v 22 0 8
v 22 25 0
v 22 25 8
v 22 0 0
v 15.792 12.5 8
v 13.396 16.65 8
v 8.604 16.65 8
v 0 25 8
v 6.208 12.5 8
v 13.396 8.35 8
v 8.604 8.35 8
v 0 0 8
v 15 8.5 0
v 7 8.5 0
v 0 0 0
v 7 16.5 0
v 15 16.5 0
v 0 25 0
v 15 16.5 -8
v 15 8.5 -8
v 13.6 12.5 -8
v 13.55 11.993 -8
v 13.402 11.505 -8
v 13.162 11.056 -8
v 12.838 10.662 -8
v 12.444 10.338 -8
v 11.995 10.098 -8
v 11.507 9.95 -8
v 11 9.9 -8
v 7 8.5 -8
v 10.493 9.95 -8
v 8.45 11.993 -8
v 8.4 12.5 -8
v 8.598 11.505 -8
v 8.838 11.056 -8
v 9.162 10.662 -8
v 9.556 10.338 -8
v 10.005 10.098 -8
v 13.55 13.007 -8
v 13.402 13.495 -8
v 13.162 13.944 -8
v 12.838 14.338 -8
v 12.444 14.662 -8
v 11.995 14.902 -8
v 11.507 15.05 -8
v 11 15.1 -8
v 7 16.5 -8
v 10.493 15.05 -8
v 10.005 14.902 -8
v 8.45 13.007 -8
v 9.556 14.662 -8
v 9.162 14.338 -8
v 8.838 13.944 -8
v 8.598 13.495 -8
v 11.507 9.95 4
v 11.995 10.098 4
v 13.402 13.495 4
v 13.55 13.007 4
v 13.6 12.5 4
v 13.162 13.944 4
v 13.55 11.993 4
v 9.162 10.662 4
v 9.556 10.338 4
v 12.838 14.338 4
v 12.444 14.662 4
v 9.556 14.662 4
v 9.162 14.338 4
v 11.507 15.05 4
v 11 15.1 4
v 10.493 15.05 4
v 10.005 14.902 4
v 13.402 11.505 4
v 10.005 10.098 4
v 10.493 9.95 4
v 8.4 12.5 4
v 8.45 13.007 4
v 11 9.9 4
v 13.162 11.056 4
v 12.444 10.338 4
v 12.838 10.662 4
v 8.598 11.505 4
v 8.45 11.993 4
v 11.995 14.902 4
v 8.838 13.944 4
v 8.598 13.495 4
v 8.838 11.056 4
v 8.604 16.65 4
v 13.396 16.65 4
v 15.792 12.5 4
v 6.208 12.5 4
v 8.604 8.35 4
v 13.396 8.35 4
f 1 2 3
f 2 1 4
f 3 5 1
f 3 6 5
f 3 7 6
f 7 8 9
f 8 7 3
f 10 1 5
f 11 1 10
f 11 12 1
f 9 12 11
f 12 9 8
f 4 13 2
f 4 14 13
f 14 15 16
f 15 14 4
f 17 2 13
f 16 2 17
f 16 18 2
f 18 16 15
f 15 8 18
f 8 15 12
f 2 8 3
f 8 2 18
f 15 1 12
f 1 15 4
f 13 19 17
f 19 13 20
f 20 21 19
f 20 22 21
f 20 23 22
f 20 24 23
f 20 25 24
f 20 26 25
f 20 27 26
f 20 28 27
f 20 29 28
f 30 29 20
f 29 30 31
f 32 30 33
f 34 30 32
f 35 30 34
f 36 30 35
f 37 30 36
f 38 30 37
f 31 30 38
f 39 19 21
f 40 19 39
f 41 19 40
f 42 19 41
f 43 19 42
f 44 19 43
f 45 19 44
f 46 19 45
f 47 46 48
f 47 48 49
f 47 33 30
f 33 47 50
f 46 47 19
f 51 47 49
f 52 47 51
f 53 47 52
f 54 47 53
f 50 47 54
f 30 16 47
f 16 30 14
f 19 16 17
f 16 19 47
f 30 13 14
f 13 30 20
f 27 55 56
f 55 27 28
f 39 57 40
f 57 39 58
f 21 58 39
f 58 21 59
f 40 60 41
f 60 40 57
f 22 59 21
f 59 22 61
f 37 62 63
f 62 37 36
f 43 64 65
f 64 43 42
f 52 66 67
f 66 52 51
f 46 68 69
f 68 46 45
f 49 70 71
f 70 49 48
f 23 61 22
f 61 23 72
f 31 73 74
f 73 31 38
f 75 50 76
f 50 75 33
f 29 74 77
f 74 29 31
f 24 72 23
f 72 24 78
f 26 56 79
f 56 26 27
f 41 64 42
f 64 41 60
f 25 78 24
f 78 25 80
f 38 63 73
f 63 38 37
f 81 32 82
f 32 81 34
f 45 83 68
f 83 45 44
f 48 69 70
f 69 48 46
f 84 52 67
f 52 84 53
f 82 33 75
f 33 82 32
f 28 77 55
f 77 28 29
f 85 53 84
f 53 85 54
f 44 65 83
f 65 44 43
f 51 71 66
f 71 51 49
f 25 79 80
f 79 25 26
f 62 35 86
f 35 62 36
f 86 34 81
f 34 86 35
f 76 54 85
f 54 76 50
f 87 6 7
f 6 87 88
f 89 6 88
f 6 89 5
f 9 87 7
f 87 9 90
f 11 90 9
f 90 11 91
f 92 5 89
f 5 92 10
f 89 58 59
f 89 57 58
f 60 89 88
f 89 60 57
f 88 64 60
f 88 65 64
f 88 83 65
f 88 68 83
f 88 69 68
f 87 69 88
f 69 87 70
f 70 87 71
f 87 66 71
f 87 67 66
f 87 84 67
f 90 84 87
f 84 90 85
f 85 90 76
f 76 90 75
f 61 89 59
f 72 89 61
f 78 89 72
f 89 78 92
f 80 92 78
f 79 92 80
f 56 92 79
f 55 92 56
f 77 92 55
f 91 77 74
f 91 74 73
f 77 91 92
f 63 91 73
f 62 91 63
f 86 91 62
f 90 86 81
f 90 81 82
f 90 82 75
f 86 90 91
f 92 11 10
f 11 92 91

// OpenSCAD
// file: ../params.scad
// ============================================================
// Ham Radio Go Kit — OpenSCAD Parameters
// ============================================================

// ============================================================
// SHELF SLOT — MEASURED (configurable for other shelves)
// ============================================================
slot_width = 8.1;           // mm, slot opening width — MEASURED on Vevor shelf
slot_spacing = 5.0;         // mm, rail width between slots
shelf_thickness = 1.5;      // mm, shelf material thickness
slot_tab_width = 8.0;       // mm, tab width (fits in 8.1mm slot)
slot_tab_depth = 8.0;       // mm, tab depth (how far tab extends below shelf)
slot_tab_engage = 2.0;      // mm, minimum engagement depth for retention

// ============================================================
// M5 HARDWARE
// ============================================================
m5_screw_d = 5.2;           // mm, clearance hole diameter
m5_nut_w = 8.0;             // mm, hex nut width across flats
m5_nut_h = 4.0;             // mm, hex nut height
m5_washer_od = 10.0;        // mm, washer OD - verify clears slot

// ============================================================
// TOLERANCES
// ============================================================
fit_clearance = 0.2;        // mm, slot tab fit clearance
nut_pocket_tol = 0.3;       // mm, nut pocket oversize for capture

// ============================================================
// VELCRO STRAP MOUNTS
// ============================================================
velcro_width = 19.05;       // mm, 0.75" velcro - standardize all straps
velcro_channel_clearance = 1.0;  // mm, channel oversize
mount_body_w = 25.0;        // mm
mount_body_d = 25.0;        // mm
mount_body_h = 8.0;         // mm, sets max gear height that can be strapped

// ============================================================
// PINEBOOK PRO — measure closed unit with calipers
// ============================================================
pbp_w = 280.0;              // mm, width
pbp_d = 192.0;              // mm, depth
pbp_h = 12.0;               // mm, closed lid thickness — MEASURE
pbp_clearance = 0.5;        // mm, fit clearance inside captures

// L-mount (front, x2)
l_arm_thickness = 4.0;      // mm, horizontal arm thickness
l_arm_length = 15.0;        // mm, how far arm extends over laptop top

// Corner mount (rear, x2)
corner_wall_thickness = 4.0;  // mm
corner_wall_h = 20.0;         // mm, should be > pbp_h + corner_arm_thickness
corner_arm_length = 15.0;     // mm, top retention arm extends over laptop
corner_arm_thickness = 4.0;   // mm

// ============================================================
// MFJ-939 BRACKETS — measure on physical unit
// ============================================================
mfj939_chassis_w = 0.0;        // mm, outside width — MEASURE
mfj939_side_screw_d = 3.5;     // mm, #6-32 clearance hole — VERIFY
mfj939_side_screw_spacing = 0.0; // mm, fore/aft spacing between screw holes on side panel — MEASURE
mfj939_screw_height = 0.0;     // mm, screw centerline height above shelf surface — MEASURE

// Bracket geometry
bracket_foot_d = 25.0;         // mm, horizontal foot depth on shelf
bracket_foot_h = 8.0;          // mm, horizontal foot thickness
bracket_arm_thickness = 4.0;   // mm, vertical arm thickness
// main file
// ============================================================
// Slot Mount Base Module
// ============================================================
// Reusable foundation for all shelf mounts
// Provides slot tab, mounting surface, M5 hole, and nut pocket

include <../params.scad>

module slot_mount_base() {
    // Horizontal base that sits on top of shelf
    // Need enough width for: slot tab + walls around nut pocket
    // Nut pocket circumradius ≈ 4.8mm, need 3mm wall minimum = 10.8mm radius
    // So 21.6mm minimum, round up to 22mm for comfortable walls
    base_width = 22;  // mm, provides 7mm wall on each side of slot tab
    base_depth = mount_body_d;
    base_height = mount_body_h;

    difference() {
        union() {
            // Main horizontal base body
            translate([0, 0, 0])
                cube([base_width, base_depth, base_height]);

            // Slot tab (extends downward from bottom of base)
            translate([(base_width - slot_tab_width) / 2,
                      (base_depth - slot_tab_width) / 2,
                      -slot_tab_depth])
                cube([slot_tab_width, slot_tab_width, slot_tab_depth]);
        }

        // M5 screw clearance hole (through entire base)
        translate([base_width / 2, base_depth / 2, -slot_tab_depth - 1])
            cylinder(h = base_height + slot_tab_depth + 2, d = m5_screw_d, $fn = 32);

        // Hex nut pocket (from top, side-loading style)
        // Using cos(30) to convert across-flats to circumradius
        translate([base_width / 2, base_depth / 2, base_height - m5_nut_h])
            cylinder(h = m5_nut_h + 1,
                    d = (m5_nut_w + nut_pocket_tol) / cos(30),
                    $fn = 6);
    }
}

// Test render
slot_mount_base();
